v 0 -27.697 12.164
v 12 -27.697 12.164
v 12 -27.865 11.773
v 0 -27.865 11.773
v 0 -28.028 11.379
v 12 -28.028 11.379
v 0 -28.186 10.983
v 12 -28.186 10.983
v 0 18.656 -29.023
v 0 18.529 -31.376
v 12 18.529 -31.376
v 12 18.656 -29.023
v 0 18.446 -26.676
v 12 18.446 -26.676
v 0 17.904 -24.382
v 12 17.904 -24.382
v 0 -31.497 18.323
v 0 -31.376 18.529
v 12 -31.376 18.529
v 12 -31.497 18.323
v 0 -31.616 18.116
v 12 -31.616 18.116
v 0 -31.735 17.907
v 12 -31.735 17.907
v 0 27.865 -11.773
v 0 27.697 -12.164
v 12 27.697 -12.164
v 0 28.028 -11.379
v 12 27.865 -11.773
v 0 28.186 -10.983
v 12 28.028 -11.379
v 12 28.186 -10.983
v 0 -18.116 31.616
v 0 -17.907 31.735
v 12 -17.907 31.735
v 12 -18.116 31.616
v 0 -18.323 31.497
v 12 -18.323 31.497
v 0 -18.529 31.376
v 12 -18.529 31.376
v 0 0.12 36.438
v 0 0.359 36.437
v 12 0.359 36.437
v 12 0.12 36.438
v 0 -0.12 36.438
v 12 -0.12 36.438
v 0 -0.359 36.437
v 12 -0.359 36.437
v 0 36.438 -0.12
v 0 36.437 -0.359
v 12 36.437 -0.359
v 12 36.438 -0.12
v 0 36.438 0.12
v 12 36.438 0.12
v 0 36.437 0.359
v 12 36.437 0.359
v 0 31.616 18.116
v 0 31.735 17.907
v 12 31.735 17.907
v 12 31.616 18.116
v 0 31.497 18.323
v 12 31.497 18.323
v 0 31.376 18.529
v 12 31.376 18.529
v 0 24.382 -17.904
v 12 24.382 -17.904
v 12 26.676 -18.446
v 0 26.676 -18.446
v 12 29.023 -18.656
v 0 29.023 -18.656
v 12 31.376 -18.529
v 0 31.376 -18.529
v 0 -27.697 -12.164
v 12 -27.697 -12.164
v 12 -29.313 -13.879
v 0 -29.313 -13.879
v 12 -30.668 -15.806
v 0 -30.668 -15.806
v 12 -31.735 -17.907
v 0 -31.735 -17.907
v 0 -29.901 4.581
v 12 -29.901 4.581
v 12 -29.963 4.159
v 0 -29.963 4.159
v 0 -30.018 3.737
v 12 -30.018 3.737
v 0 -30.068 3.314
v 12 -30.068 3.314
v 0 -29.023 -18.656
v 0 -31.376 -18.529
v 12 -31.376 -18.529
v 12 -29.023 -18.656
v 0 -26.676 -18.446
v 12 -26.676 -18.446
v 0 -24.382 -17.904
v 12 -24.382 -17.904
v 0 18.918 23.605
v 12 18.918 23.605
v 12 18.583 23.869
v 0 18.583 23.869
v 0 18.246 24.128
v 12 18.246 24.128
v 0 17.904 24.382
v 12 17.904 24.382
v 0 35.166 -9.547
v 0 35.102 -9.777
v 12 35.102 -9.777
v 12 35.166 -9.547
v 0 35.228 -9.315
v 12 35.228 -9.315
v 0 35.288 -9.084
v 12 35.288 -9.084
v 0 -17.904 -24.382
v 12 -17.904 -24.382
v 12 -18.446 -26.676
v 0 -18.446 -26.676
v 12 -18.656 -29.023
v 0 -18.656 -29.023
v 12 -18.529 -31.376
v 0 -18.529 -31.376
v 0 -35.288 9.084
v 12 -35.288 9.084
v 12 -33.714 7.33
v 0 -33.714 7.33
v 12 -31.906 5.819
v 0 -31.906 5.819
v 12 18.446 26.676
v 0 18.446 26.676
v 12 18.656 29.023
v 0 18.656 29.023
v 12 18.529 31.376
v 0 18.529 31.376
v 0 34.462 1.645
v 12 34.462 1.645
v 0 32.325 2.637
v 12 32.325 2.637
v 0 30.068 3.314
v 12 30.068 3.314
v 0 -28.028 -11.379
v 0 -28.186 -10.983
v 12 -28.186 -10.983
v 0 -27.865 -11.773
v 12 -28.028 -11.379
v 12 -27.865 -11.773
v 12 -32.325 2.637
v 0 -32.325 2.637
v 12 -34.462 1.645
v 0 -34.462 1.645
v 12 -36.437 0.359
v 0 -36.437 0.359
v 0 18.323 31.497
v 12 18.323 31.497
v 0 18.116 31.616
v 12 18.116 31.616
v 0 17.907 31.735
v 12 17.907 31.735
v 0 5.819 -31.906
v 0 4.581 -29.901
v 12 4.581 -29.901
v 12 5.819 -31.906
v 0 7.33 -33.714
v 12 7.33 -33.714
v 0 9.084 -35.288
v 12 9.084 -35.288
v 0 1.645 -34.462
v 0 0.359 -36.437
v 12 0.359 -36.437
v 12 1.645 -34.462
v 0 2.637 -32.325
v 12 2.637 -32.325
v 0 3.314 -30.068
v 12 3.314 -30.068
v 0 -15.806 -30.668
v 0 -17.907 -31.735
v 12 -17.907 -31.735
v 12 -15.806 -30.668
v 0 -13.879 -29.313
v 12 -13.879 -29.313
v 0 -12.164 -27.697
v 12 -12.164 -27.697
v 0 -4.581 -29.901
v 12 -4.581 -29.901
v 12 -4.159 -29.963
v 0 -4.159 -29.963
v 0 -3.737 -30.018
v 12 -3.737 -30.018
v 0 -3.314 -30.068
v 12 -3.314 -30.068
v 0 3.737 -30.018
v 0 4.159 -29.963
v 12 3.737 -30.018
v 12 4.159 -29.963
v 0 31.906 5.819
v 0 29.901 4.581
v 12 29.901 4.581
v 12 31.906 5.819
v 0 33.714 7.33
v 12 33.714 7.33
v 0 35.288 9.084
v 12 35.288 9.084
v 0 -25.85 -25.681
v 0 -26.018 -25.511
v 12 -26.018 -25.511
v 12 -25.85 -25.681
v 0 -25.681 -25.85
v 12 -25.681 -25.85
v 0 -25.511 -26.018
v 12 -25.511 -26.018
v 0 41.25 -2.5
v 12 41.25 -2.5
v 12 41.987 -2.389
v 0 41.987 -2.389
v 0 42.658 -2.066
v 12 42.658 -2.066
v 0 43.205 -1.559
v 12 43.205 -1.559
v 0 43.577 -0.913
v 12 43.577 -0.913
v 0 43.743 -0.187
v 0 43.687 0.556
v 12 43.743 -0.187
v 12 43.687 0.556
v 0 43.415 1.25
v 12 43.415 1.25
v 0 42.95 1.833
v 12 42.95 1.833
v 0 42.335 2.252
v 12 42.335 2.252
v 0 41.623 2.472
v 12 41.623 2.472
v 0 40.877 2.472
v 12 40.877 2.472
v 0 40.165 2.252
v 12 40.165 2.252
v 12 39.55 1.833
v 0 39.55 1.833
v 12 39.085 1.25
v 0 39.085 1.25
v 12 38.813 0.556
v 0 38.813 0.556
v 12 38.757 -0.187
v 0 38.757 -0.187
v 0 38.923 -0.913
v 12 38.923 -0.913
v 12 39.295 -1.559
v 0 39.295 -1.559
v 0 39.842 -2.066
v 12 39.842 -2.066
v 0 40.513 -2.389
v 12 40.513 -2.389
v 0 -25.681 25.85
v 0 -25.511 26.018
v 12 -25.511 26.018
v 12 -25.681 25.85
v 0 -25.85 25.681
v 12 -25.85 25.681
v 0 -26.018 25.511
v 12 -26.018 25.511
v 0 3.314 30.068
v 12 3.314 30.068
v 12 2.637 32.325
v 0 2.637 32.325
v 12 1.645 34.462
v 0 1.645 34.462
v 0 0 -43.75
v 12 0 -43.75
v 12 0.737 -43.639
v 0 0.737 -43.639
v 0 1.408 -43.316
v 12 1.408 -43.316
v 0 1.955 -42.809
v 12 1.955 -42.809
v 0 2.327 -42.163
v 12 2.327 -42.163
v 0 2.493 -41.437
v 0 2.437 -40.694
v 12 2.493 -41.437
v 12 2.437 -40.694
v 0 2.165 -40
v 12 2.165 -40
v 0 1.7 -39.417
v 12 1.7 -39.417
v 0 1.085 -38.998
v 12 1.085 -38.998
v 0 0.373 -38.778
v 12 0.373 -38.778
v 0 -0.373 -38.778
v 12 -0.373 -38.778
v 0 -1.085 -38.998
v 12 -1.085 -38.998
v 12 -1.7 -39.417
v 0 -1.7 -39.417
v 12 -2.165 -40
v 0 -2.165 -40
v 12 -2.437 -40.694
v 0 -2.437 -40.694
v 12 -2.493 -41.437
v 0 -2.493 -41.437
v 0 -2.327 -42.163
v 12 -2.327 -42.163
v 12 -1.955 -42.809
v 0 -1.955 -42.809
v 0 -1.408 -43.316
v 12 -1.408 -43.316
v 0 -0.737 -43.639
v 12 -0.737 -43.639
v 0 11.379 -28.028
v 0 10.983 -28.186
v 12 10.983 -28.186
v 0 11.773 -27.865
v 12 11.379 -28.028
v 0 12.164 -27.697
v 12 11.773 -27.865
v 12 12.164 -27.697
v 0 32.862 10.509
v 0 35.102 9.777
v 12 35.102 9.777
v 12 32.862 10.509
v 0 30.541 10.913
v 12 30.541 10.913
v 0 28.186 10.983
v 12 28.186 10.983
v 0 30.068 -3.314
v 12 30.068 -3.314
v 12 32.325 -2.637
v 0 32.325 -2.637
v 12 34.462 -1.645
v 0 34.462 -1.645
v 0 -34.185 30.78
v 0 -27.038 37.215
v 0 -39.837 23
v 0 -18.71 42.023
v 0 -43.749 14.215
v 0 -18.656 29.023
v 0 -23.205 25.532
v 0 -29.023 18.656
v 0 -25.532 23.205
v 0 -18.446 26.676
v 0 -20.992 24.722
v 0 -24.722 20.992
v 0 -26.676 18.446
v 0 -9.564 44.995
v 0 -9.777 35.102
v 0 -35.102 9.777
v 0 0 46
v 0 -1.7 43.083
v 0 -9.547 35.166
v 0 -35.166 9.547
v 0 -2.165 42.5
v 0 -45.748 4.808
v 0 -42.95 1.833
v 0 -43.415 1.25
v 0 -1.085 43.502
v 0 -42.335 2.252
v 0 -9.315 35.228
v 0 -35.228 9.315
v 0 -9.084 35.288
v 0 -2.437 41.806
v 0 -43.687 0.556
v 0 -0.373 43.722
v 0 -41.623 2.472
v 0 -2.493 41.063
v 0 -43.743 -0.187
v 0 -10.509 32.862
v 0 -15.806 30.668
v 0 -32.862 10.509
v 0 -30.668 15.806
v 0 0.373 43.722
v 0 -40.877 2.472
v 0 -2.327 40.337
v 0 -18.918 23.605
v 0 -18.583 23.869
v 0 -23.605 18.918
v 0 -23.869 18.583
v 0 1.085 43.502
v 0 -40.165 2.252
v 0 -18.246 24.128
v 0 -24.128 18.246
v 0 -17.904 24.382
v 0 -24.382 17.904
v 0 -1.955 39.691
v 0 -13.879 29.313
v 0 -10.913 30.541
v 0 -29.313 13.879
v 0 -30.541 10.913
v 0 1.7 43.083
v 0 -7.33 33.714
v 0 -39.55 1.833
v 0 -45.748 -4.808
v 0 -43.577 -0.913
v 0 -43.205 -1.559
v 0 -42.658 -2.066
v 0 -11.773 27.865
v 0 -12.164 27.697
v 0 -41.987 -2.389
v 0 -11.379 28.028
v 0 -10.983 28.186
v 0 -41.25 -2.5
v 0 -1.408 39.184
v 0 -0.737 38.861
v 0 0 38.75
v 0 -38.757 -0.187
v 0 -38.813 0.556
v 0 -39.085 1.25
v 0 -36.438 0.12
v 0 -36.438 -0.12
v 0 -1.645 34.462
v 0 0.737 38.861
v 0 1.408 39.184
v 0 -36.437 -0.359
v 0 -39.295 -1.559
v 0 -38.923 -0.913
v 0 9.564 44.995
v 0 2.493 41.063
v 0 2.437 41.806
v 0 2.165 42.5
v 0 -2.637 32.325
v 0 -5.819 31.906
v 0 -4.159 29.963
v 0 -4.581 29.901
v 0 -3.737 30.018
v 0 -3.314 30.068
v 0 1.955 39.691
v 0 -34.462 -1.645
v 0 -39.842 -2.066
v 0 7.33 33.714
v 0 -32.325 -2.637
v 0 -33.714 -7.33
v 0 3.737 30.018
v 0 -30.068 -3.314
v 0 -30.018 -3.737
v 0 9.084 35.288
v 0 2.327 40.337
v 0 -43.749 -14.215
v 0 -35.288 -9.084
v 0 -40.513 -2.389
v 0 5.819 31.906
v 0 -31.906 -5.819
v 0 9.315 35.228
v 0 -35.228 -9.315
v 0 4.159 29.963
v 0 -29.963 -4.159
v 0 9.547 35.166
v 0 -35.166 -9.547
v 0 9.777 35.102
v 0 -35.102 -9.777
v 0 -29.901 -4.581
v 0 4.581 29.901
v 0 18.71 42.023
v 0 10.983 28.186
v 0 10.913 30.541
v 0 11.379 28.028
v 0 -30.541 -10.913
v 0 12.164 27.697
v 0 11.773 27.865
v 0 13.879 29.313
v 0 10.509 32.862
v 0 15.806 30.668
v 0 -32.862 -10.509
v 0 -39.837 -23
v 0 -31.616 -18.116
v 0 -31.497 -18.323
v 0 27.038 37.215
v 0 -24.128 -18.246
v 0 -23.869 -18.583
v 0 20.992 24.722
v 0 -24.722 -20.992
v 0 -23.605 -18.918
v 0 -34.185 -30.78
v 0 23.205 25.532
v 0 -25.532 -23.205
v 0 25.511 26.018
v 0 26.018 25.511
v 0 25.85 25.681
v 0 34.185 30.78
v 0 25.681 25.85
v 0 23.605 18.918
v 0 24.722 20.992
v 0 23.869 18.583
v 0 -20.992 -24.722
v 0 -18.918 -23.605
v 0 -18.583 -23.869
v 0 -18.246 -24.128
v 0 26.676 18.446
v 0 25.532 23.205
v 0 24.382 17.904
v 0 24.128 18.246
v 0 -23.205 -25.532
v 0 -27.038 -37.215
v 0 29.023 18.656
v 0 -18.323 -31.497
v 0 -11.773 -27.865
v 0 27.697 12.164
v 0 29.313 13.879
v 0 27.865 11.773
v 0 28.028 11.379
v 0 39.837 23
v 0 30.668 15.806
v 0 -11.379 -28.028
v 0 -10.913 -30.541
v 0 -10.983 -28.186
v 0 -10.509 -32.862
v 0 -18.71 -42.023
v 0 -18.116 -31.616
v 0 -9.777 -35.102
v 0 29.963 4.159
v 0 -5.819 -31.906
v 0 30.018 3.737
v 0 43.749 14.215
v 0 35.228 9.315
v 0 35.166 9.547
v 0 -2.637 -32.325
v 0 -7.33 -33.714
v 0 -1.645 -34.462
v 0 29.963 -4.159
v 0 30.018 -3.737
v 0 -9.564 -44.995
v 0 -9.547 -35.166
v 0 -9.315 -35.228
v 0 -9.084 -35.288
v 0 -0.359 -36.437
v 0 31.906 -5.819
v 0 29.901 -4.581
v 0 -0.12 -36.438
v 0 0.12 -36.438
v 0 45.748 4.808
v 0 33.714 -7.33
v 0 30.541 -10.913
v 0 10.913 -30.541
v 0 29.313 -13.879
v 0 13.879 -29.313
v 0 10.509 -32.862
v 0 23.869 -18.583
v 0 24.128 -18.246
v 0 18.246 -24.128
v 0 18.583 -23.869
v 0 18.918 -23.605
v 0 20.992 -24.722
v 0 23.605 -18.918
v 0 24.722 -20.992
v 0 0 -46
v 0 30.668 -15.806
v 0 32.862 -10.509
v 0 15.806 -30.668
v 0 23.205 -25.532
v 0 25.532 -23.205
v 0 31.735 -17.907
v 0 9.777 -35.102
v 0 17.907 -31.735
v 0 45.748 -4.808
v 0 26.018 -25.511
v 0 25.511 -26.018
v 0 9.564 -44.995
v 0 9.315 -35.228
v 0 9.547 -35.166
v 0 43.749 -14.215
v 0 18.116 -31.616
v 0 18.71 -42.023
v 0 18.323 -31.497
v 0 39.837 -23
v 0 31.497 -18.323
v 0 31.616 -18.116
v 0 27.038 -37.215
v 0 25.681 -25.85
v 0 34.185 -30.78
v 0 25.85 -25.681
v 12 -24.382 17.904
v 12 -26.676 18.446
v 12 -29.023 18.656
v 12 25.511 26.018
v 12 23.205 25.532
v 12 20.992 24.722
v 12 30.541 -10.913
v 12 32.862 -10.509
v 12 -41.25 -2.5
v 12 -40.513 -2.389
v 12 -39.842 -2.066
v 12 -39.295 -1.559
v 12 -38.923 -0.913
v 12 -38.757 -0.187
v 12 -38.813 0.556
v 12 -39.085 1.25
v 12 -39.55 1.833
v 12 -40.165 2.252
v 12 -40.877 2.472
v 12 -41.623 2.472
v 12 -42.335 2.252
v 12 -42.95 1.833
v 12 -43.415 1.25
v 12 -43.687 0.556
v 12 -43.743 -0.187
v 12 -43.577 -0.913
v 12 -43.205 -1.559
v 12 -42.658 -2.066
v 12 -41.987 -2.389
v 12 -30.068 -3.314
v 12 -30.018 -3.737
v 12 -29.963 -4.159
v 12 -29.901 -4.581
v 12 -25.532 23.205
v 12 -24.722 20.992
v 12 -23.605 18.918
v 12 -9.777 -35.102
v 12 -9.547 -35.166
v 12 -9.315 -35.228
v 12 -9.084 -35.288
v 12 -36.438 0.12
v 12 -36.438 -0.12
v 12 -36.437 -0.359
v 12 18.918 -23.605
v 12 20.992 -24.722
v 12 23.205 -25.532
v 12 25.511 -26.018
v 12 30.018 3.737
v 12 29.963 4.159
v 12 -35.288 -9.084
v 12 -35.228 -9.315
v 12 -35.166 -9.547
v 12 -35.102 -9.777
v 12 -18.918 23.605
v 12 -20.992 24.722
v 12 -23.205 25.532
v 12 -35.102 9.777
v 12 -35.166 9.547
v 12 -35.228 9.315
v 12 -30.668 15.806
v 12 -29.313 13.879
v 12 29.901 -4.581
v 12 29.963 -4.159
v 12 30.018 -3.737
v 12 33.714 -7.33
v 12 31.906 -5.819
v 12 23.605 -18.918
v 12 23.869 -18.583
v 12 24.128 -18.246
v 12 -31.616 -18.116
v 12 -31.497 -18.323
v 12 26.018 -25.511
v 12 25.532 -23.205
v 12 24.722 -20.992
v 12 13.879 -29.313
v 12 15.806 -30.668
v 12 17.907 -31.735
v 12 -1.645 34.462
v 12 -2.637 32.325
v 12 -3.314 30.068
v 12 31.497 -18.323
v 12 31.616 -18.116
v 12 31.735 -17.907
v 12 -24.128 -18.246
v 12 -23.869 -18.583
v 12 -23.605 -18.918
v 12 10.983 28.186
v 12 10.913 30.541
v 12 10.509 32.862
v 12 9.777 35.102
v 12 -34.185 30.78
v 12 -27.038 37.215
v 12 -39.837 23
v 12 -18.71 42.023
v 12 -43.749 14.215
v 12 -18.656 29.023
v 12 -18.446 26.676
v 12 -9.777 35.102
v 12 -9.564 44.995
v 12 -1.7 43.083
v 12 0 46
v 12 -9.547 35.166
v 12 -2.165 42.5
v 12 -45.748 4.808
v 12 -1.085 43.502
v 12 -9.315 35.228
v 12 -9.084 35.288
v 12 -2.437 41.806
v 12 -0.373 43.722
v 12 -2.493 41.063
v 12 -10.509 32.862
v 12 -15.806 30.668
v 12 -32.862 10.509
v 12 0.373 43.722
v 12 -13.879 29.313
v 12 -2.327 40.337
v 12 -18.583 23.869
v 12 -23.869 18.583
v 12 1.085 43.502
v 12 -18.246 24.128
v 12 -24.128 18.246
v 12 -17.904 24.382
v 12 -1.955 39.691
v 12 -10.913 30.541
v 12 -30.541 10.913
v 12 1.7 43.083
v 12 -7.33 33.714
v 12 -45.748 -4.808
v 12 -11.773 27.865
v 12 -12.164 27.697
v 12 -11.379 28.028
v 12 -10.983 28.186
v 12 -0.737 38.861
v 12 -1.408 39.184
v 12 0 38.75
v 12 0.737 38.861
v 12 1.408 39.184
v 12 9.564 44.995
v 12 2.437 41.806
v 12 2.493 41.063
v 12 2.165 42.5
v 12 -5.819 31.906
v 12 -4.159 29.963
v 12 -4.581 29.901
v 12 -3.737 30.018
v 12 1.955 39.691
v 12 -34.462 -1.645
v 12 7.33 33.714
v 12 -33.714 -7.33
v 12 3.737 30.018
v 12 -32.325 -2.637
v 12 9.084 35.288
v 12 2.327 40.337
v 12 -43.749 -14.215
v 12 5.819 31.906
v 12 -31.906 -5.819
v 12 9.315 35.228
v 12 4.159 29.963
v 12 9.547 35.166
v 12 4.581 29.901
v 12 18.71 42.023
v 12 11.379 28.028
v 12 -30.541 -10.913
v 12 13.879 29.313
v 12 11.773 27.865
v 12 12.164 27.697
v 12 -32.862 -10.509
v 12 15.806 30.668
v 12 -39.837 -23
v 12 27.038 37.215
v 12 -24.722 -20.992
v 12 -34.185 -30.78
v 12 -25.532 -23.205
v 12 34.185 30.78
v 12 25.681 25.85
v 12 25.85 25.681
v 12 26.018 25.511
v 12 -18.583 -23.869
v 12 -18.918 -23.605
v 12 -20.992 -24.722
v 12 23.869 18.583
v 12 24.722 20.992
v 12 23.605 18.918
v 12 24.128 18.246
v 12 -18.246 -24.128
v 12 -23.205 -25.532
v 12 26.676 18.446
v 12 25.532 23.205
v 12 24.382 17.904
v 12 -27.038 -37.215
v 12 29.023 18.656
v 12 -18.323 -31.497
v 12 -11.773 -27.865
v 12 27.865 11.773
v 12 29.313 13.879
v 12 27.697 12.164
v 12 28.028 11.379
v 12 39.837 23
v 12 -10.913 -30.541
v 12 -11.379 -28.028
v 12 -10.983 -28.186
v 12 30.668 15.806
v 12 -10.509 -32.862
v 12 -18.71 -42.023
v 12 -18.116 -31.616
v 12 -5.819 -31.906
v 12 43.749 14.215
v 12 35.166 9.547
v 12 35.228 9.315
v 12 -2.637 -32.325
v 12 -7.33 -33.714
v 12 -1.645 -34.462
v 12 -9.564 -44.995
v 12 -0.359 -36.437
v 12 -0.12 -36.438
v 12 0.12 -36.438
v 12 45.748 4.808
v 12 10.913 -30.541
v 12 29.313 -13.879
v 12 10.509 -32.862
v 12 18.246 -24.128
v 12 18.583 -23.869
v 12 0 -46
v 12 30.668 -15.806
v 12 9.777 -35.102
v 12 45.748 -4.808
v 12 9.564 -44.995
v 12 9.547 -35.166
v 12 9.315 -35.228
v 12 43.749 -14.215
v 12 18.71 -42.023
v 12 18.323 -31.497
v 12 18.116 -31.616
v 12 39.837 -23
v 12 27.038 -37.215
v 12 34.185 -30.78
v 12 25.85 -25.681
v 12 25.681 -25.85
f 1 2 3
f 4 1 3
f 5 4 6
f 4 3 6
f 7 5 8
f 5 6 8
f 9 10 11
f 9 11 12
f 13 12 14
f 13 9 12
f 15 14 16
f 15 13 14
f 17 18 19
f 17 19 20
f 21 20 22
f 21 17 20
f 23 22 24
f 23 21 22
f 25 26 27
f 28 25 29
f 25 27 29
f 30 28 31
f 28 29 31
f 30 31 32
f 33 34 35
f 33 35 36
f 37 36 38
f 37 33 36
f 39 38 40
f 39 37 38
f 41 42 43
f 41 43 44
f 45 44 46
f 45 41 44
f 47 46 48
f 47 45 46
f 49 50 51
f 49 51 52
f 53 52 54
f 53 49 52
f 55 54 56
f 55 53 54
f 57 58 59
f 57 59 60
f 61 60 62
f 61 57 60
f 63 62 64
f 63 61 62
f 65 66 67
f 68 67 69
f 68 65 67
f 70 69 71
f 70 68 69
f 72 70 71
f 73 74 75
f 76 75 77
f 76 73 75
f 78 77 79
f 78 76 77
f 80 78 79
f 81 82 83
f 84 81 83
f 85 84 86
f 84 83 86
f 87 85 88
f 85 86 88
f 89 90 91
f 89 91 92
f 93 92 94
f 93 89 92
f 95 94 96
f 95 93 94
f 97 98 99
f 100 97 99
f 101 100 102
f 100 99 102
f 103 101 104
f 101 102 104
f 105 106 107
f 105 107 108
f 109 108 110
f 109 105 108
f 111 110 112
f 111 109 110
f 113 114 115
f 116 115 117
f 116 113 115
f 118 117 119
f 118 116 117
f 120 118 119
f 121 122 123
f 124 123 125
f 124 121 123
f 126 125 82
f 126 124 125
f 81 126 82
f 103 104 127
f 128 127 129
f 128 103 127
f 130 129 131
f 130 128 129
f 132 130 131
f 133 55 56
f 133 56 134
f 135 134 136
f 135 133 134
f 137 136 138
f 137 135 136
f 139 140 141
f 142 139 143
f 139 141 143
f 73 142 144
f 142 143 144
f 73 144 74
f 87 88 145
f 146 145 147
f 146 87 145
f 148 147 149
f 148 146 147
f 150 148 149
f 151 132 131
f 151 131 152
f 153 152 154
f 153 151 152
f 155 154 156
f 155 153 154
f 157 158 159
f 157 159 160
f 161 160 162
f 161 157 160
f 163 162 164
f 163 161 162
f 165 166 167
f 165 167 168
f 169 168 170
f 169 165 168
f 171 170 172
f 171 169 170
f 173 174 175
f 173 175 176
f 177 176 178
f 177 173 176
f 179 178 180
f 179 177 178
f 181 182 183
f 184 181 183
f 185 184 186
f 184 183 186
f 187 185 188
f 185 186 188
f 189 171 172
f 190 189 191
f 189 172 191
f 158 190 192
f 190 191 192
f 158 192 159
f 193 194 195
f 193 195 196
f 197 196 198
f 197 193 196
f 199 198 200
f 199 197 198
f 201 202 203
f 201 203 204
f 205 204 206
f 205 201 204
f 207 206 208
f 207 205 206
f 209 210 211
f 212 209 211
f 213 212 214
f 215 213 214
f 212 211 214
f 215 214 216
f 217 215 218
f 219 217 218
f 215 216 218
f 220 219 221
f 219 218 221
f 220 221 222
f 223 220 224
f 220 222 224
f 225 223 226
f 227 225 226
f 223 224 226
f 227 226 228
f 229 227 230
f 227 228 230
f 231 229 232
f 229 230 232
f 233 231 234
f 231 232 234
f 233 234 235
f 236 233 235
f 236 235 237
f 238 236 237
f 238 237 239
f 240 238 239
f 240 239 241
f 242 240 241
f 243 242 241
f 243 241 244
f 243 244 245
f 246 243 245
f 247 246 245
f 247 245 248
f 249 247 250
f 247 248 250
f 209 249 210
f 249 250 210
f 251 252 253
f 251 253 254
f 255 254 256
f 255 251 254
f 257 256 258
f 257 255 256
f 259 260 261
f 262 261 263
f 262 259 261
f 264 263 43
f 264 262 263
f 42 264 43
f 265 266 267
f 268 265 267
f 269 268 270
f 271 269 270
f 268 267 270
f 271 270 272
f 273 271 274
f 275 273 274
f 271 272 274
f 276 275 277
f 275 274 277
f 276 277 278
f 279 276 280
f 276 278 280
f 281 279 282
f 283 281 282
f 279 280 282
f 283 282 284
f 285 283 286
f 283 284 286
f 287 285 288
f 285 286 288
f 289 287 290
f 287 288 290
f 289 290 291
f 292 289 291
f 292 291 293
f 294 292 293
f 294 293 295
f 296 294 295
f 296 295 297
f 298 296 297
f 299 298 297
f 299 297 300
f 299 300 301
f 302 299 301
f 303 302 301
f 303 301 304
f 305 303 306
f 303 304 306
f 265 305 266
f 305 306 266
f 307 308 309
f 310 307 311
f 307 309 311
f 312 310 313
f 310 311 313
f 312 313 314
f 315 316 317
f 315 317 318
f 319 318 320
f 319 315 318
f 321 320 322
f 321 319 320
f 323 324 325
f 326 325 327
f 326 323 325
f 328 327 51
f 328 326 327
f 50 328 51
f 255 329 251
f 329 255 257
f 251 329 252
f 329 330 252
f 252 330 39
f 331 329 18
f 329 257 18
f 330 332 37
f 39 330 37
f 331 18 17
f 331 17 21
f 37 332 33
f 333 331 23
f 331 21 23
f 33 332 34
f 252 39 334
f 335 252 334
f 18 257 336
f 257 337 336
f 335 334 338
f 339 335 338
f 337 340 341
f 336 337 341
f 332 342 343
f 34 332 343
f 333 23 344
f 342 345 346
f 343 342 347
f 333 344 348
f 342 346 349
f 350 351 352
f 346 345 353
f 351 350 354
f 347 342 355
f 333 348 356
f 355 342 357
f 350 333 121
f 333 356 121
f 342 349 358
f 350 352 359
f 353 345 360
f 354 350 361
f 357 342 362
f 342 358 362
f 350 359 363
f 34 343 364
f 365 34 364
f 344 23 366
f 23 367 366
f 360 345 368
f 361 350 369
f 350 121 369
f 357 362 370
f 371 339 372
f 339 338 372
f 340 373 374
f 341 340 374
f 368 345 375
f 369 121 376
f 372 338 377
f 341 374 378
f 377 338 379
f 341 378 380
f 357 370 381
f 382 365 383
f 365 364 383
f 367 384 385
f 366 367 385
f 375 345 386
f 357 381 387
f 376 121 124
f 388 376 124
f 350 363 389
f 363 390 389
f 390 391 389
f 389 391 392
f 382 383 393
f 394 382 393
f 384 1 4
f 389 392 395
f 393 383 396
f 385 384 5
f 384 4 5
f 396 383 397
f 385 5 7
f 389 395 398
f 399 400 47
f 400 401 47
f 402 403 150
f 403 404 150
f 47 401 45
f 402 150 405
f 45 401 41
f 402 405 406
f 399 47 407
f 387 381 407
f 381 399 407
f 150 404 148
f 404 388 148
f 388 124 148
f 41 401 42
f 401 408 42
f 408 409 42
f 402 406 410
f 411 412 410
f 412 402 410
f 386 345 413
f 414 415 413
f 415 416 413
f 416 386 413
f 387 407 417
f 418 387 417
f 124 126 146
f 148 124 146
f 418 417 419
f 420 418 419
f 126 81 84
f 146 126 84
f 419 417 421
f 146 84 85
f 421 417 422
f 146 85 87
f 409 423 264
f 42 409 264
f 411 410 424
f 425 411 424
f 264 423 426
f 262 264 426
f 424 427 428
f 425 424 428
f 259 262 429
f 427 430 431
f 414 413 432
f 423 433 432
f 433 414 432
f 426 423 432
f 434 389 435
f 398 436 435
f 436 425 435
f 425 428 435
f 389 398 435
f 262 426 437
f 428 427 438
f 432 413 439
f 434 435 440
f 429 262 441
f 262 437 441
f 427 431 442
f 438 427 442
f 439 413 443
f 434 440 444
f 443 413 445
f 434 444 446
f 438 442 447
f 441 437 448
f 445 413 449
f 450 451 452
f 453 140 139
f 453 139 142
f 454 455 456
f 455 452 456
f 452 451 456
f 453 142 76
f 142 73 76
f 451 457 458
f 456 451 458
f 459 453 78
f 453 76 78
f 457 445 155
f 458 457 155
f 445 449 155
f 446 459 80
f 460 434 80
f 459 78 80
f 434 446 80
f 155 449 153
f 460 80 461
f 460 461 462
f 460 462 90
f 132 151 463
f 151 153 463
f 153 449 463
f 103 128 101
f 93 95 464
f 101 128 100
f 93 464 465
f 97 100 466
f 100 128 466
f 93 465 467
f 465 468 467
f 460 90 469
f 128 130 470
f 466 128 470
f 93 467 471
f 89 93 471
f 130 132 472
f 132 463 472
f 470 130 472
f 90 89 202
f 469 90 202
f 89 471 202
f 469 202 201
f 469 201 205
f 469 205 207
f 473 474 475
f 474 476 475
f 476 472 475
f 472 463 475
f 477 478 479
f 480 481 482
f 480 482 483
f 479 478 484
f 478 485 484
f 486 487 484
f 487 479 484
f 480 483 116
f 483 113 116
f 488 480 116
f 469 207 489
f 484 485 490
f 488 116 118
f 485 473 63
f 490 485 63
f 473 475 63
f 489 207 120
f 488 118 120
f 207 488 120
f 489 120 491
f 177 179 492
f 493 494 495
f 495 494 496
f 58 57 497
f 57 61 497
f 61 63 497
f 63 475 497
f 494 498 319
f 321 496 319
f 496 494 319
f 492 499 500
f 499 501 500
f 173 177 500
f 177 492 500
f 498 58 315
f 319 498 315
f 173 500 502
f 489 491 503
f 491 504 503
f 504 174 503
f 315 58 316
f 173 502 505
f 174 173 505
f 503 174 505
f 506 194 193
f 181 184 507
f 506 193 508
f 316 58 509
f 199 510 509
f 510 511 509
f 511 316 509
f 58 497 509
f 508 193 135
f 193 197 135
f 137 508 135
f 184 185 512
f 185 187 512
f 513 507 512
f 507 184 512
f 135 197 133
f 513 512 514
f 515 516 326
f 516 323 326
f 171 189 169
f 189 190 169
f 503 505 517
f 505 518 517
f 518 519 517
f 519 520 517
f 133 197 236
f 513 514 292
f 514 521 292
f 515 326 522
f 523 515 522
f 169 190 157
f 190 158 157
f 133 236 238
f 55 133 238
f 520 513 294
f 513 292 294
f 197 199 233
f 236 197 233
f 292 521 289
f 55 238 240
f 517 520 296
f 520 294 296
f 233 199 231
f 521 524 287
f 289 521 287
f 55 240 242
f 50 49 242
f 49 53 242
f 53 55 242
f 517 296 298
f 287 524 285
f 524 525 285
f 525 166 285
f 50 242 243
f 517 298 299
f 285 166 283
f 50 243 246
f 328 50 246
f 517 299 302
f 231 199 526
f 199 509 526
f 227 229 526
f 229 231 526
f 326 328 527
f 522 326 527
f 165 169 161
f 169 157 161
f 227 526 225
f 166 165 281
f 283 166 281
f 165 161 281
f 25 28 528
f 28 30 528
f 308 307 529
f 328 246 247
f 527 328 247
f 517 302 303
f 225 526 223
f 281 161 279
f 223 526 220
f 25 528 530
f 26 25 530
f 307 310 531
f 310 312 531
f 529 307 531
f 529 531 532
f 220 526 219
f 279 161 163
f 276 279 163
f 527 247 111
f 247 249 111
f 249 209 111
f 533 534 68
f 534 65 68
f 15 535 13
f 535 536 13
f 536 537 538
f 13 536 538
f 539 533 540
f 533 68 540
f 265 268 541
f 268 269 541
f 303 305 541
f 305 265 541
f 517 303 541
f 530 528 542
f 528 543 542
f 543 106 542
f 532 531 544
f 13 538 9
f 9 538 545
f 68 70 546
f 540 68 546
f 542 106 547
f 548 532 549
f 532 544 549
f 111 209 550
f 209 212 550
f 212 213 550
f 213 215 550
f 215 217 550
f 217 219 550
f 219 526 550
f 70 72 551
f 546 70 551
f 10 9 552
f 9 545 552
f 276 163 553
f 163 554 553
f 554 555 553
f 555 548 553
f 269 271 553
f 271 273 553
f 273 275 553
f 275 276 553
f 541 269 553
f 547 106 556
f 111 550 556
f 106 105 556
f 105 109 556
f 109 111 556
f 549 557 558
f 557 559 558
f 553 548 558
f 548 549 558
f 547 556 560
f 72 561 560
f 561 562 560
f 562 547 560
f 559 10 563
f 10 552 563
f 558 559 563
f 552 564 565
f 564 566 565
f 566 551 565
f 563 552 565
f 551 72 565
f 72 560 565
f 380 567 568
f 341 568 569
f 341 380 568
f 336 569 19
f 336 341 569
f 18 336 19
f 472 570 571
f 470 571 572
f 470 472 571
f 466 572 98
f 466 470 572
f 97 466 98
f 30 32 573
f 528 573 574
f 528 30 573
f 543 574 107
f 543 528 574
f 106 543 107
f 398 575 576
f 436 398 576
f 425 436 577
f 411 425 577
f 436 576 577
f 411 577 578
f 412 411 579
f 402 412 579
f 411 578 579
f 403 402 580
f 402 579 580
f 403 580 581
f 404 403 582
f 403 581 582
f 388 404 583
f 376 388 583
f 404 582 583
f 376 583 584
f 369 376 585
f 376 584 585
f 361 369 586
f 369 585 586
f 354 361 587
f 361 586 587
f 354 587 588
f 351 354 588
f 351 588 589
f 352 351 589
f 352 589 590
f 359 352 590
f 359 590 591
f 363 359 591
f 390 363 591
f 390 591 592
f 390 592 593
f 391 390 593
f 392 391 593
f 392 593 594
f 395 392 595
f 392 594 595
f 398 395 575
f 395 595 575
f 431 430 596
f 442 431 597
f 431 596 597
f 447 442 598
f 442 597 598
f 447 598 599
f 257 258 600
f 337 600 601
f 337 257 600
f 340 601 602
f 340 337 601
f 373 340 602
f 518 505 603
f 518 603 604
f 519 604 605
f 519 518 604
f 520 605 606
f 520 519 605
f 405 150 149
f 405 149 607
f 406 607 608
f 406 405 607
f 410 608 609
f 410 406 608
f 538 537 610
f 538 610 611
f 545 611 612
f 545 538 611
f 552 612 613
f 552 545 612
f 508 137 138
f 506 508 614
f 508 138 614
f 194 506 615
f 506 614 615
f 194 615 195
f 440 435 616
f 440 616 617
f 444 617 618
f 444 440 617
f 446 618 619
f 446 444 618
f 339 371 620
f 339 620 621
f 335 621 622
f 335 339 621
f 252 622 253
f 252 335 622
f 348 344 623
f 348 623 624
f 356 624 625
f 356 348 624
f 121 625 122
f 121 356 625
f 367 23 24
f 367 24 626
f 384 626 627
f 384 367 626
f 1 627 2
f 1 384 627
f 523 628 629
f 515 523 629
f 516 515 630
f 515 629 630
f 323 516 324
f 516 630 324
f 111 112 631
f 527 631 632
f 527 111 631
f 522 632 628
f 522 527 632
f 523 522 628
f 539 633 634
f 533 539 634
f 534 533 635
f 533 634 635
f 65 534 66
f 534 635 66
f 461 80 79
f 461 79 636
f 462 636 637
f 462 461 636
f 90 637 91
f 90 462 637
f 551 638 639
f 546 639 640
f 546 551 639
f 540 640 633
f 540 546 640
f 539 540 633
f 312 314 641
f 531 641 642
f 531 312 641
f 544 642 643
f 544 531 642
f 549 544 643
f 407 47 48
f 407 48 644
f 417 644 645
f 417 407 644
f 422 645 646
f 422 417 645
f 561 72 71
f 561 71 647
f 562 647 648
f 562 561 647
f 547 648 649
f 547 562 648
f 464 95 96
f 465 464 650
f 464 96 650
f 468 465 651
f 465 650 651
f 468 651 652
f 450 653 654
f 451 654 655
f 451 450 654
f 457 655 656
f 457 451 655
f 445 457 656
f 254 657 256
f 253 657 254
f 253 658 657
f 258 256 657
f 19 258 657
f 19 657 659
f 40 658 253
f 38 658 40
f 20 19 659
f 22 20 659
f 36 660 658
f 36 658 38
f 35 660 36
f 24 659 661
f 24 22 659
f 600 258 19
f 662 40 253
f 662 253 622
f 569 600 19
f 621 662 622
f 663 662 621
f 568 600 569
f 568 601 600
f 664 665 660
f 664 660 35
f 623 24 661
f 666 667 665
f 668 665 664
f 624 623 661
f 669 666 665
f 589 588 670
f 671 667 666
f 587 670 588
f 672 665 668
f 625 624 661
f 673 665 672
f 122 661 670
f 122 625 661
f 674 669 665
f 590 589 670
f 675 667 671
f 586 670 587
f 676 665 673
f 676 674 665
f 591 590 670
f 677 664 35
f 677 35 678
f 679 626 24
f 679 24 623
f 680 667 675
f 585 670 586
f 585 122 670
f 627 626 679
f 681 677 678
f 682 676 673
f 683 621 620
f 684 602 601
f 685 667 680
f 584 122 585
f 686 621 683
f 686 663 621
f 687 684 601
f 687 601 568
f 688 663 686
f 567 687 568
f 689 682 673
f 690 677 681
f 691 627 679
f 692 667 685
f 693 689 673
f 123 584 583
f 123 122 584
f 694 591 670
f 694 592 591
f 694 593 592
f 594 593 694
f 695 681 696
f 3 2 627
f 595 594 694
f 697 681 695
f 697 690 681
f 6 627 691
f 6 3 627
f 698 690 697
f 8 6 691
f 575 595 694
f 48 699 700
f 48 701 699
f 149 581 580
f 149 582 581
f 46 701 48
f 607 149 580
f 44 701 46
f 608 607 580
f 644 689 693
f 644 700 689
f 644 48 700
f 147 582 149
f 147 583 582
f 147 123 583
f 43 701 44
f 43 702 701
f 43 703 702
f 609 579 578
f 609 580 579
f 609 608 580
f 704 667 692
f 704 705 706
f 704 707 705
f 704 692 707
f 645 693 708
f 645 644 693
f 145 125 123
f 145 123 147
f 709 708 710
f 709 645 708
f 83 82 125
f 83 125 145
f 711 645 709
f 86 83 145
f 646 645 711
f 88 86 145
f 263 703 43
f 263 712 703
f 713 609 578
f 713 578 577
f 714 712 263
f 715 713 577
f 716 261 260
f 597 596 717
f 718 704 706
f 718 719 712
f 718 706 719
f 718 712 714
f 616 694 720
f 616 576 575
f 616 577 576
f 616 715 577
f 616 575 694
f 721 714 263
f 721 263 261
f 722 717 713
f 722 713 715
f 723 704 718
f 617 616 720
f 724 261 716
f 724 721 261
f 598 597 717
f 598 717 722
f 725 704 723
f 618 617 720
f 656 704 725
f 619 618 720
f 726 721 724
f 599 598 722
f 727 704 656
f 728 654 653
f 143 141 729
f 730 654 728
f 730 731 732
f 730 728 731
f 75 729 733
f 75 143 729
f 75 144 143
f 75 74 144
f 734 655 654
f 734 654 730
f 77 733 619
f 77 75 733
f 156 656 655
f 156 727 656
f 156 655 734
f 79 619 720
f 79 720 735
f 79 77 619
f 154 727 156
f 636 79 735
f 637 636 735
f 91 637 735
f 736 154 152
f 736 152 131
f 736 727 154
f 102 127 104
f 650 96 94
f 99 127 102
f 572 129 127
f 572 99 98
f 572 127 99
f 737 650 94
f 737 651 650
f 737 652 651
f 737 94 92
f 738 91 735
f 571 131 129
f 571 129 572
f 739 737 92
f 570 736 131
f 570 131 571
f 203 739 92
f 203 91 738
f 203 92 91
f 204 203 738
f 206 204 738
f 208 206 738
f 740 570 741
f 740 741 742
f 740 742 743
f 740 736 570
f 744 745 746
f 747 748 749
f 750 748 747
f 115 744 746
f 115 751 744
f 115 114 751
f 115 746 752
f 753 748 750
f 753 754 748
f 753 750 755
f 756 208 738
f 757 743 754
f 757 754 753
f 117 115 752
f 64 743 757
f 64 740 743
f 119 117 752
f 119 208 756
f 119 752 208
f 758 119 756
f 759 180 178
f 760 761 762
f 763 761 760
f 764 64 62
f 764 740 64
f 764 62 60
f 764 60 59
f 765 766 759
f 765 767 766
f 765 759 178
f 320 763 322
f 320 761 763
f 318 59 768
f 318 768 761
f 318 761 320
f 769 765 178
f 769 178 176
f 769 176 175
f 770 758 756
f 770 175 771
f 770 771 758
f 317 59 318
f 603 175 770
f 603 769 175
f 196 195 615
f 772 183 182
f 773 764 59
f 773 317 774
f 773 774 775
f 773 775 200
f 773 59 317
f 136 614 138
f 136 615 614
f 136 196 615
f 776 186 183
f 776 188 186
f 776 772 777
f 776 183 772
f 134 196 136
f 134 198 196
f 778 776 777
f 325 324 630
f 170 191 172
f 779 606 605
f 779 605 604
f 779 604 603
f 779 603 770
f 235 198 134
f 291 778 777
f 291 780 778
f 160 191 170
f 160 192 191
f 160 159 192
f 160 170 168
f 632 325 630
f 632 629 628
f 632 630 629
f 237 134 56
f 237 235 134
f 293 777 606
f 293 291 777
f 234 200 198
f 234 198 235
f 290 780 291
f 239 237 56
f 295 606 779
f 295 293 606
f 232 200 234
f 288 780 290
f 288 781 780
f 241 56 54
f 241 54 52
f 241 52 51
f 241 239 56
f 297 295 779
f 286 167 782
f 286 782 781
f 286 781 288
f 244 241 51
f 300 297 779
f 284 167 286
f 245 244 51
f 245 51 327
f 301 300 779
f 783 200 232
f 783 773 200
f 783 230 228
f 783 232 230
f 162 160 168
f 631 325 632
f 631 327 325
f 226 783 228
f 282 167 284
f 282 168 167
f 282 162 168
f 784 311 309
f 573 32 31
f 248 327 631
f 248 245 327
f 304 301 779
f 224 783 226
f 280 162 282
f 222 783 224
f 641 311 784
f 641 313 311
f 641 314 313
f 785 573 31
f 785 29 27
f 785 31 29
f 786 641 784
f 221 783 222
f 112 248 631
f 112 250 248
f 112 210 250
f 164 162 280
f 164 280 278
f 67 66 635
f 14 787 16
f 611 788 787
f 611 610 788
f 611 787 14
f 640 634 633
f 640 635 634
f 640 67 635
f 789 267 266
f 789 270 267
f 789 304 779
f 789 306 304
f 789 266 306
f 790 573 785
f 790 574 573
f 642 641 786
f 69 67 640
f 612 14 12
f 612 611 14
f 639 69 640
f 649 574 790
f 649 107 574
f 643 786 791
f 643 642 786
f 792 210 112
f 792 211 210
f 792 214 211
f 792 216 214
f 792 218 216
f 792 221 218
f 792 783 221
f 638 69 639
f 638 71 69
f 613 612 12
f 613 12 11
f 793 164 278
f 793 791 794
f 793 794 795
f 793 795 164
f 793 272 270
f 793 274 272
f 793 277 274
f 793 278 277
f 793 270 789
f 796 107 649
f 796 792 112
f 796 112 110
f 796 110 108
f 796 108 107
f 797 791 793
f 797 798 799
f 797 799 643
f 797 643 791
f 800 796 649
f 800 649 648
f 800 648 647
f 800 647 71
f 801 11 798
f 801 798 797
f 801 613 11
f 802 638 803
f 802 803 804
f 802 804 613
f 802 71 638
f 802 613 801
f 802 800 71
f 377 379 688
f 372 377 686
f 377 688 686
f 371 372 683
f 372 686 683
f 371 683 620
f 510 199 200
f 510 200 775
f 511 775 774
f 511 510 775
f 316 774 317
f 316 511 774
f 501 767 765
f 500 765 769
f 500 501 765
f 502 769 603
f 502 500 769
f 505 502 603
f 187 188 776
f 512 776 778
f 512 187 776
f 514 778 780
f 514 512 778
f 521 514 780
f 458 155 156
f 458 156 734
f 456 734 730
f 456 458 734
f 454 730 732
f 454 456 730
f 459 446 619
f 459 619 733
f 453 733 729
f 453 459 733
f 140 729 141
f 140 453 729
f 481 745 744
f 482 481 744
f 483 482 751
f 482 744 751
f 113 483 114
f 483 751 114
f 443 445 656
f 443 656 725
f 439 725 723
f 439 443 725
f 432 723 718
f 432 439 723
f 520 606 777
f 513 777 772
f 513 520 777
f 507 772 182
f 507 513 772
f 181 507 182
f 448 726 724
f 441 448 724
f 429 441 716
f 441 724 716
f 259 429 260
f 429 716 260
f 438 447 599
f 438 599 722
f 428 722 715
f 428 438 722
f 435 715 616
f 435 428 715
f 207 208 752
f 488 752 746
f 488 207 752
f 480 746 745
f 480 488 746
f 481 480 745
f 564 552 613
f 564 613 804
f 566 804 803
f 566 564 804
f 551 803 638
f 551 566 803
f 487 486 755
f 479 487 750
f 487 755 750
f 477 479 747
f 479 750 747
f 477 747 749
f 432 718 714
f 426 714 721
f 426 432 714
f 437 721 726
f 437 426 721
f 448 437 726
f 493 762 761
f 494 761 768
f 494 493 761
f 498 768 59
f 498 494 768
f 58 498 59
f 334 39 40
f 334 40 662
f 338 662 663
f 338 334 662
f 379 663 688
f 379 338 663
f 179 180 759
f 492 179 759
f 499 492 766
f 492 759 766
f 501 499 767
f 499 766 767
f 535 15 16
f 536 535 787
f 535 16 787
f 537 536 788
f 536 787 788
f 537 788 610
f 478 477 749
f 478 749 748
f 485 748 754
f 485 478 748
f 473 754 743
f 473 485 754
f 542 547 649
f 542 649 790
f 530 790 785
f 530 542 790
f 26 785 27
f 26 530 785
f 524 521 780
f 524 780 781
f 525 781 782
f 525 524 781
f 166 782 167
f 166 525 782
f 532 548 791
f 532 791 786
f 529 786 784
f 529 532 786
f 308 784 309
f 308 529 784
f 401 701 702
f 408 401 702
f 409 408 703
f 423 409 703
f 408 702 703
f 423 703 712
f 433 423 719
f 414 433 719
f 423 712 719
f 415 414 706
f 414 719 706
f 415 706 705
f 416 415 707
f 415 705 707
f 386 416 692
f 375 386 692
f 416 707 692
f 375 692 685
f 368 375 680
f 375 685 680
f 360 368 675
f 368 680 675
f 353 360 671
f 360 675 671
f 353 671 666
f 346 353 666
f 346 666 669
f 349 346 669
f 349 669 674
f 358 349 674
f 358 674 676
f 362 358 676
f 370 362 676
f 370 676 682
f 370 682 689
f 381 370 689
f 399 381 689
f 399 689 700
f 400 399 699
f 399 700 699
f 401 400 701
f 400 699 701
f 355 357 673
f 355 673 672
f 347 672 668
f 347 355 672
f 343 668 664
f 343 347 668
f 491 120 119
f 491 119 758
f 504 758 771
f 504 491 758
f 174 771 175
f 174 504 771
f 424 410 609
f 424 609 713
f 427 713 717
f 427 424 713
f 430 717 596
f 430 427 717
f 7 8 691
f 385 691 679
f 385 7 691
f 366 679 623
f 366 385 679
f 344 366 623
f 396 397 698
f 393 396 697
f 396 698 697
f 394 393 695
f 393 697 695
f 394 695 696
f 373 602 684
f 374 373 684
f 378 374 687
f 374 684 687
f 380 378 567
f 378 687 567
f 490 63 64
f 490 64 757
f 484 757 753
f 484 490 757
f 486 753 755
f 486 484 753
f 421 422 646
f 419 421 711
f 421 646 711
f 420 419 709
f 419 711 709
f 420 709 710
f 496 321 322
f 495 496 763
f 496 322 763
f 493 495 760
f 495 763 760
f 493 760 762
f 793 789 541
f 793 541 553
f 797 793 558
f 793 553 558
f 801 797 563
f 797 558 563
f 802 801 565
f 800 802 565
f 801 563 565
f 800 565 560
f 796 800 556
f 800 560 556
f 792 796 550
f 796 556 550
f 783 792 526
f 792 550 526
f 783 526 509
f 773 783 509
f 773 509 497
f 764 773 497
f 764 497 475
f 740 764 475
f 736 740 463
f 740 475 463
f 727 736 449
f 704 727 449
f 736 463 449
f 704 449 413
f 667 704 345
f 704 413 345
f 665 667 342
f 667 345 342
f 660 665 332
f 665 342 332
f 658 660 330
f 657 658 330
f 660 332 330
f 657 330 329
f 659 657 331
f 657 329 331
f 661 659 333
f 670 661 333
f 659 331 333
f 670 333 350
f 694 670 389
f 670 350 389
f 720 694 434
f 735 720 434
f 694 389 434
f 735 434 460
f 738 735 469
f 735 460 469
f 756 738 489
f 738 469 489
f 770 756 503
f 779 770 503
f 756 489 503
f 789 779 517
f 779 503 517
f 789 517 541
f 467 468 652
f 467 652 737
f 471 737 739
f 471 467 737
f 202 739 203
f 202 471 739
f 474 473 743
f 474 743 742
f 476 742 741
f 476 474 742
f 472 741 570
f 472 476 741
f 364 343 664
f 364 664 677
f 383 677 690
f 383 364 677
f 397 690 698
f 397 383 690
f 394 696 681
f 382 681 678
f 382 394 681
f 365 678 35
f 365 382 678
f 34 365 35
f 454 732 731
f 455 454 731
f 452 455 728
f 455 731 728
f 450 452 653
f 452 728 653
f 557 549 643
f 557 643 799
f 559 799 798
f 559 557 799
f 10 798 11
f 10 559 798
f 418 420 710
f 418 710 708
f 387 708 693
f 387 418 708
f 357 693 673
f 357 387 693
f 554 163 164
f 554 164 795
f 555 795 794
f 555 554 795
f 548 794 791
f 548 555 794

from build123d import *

# Parameters (mm, degrees)
BASPROSKE_W         = 12
BASPROSKE_H         = 6.2139
TOOTHCUT_DEPTH      = 53.945557004
TEETHCUTS_COUNT     = 24
TEETHCUTS_ANGLE     = 345
BOSS_EXTRUDE1_START = -12
SKETCH1_R           = 46
SKETCH1_R_2         = 36.4385
BOSS_EXTRUDE1_DEPTH = 12
SKETCH2_R           = 2.5
CUT_EXTRUDE1_DEPTH  = 12


with BuildPart() as part:
    # BasProSke → Base-Revolve (revolve)
    with BuildSketch(Plane(origin=(0, 0, 0), x_dir=(1, 0, 0), z_dir=(0, 1, 0)), mode=Mode.PRIVATE) as base_revolve_sk:
        with Locations((6, 33.35695)):
            Rectangle(BASPROSKE_W, BASPROSKE_H)
    revolve(base_revolve_sk.sketch.rotate(Axis((-10, 0, 0), (1, 0, 0)), 180), axis=Axis((-10, 0, 0), (1, 0, 0)))

    # TooCutSke → ToothCut (cut, through all)
    with BuildSketch(Plane(origin=(0, 0, 0), x_dir=(0, 0, -1), z_dir=(1, 0, 0))):
        with BuildLine():
            ThreePointArc((3.32012603, 30.041691169), (2.184951712, 33.399149944), (0.358959887, 36.436731879))
            ThreePointArc((0.358959887, 36.436731879), (0, 36.4385), (-0.358959887, 36.436731879))
            ThreePointArc((-0.358959887, 36.436731879), (-2.184951712, 33.399149944), (-3.32012603, 30.041691169))
            ThreePointArc((-3.32012603, 30.041691169), (0, 30.2246), (3.32012603, 30.041691169))
        make_face()
    toothcut = extrude(amount=TOOTHCUT_DEPTH, mode=Mode.SUBTRACT)

    # TeethCuts: ToothCut ×24 about axis
    teethcuts_axis = Axis((-10, 0, 0), (1, 0, 0))
    for i in range(1, TEETHCUTS_COUNT):
        add(toothcut.rotate(teethcuts_axis, i * TEETHCUTS_ANGLE / (TEETHCUTS_COUNT - 1)), mode=Mode.SUBTRACT)

    # Sketch1 → Boss-Extrude1 (add)
    with BuildSketch(Plane(origin=(12, 0, 0), x_dir=(0, 0, -1), z_dir=(1, 0, 0)).offset(BOSS_EXTRUDE1_START)):
        Circle(SKETCH1_R)
        Circle(SKETCH1_R_2, mode=Mode.SUBTRACT)
    extrude(amount=BOSS_EXTRUDE1_DEPTH)

    # Sketch2 → Cut-Extrude1 (cut)
    with BuildSketch(Plane(origin=(12, 0, 0), x_dir=(0, 0, -1), z_dir=(1, 0, 0))):
        with Locations((41.25, 0)):
            Circle(SKETCH2_R)
        with Locations((0, -41.25)):
            Circle(SKETCH2_R)
        with Locations((-41.25, 0)):
            Circle(SKETCH2_R)
        with Locations((0, 41.25)):
            Circle(SKETCH2_R)
    extrude(amount=-CUT_EXTRUDE1_DEPTH, mode=Mode.SUBTRACT)


solid = part.part
